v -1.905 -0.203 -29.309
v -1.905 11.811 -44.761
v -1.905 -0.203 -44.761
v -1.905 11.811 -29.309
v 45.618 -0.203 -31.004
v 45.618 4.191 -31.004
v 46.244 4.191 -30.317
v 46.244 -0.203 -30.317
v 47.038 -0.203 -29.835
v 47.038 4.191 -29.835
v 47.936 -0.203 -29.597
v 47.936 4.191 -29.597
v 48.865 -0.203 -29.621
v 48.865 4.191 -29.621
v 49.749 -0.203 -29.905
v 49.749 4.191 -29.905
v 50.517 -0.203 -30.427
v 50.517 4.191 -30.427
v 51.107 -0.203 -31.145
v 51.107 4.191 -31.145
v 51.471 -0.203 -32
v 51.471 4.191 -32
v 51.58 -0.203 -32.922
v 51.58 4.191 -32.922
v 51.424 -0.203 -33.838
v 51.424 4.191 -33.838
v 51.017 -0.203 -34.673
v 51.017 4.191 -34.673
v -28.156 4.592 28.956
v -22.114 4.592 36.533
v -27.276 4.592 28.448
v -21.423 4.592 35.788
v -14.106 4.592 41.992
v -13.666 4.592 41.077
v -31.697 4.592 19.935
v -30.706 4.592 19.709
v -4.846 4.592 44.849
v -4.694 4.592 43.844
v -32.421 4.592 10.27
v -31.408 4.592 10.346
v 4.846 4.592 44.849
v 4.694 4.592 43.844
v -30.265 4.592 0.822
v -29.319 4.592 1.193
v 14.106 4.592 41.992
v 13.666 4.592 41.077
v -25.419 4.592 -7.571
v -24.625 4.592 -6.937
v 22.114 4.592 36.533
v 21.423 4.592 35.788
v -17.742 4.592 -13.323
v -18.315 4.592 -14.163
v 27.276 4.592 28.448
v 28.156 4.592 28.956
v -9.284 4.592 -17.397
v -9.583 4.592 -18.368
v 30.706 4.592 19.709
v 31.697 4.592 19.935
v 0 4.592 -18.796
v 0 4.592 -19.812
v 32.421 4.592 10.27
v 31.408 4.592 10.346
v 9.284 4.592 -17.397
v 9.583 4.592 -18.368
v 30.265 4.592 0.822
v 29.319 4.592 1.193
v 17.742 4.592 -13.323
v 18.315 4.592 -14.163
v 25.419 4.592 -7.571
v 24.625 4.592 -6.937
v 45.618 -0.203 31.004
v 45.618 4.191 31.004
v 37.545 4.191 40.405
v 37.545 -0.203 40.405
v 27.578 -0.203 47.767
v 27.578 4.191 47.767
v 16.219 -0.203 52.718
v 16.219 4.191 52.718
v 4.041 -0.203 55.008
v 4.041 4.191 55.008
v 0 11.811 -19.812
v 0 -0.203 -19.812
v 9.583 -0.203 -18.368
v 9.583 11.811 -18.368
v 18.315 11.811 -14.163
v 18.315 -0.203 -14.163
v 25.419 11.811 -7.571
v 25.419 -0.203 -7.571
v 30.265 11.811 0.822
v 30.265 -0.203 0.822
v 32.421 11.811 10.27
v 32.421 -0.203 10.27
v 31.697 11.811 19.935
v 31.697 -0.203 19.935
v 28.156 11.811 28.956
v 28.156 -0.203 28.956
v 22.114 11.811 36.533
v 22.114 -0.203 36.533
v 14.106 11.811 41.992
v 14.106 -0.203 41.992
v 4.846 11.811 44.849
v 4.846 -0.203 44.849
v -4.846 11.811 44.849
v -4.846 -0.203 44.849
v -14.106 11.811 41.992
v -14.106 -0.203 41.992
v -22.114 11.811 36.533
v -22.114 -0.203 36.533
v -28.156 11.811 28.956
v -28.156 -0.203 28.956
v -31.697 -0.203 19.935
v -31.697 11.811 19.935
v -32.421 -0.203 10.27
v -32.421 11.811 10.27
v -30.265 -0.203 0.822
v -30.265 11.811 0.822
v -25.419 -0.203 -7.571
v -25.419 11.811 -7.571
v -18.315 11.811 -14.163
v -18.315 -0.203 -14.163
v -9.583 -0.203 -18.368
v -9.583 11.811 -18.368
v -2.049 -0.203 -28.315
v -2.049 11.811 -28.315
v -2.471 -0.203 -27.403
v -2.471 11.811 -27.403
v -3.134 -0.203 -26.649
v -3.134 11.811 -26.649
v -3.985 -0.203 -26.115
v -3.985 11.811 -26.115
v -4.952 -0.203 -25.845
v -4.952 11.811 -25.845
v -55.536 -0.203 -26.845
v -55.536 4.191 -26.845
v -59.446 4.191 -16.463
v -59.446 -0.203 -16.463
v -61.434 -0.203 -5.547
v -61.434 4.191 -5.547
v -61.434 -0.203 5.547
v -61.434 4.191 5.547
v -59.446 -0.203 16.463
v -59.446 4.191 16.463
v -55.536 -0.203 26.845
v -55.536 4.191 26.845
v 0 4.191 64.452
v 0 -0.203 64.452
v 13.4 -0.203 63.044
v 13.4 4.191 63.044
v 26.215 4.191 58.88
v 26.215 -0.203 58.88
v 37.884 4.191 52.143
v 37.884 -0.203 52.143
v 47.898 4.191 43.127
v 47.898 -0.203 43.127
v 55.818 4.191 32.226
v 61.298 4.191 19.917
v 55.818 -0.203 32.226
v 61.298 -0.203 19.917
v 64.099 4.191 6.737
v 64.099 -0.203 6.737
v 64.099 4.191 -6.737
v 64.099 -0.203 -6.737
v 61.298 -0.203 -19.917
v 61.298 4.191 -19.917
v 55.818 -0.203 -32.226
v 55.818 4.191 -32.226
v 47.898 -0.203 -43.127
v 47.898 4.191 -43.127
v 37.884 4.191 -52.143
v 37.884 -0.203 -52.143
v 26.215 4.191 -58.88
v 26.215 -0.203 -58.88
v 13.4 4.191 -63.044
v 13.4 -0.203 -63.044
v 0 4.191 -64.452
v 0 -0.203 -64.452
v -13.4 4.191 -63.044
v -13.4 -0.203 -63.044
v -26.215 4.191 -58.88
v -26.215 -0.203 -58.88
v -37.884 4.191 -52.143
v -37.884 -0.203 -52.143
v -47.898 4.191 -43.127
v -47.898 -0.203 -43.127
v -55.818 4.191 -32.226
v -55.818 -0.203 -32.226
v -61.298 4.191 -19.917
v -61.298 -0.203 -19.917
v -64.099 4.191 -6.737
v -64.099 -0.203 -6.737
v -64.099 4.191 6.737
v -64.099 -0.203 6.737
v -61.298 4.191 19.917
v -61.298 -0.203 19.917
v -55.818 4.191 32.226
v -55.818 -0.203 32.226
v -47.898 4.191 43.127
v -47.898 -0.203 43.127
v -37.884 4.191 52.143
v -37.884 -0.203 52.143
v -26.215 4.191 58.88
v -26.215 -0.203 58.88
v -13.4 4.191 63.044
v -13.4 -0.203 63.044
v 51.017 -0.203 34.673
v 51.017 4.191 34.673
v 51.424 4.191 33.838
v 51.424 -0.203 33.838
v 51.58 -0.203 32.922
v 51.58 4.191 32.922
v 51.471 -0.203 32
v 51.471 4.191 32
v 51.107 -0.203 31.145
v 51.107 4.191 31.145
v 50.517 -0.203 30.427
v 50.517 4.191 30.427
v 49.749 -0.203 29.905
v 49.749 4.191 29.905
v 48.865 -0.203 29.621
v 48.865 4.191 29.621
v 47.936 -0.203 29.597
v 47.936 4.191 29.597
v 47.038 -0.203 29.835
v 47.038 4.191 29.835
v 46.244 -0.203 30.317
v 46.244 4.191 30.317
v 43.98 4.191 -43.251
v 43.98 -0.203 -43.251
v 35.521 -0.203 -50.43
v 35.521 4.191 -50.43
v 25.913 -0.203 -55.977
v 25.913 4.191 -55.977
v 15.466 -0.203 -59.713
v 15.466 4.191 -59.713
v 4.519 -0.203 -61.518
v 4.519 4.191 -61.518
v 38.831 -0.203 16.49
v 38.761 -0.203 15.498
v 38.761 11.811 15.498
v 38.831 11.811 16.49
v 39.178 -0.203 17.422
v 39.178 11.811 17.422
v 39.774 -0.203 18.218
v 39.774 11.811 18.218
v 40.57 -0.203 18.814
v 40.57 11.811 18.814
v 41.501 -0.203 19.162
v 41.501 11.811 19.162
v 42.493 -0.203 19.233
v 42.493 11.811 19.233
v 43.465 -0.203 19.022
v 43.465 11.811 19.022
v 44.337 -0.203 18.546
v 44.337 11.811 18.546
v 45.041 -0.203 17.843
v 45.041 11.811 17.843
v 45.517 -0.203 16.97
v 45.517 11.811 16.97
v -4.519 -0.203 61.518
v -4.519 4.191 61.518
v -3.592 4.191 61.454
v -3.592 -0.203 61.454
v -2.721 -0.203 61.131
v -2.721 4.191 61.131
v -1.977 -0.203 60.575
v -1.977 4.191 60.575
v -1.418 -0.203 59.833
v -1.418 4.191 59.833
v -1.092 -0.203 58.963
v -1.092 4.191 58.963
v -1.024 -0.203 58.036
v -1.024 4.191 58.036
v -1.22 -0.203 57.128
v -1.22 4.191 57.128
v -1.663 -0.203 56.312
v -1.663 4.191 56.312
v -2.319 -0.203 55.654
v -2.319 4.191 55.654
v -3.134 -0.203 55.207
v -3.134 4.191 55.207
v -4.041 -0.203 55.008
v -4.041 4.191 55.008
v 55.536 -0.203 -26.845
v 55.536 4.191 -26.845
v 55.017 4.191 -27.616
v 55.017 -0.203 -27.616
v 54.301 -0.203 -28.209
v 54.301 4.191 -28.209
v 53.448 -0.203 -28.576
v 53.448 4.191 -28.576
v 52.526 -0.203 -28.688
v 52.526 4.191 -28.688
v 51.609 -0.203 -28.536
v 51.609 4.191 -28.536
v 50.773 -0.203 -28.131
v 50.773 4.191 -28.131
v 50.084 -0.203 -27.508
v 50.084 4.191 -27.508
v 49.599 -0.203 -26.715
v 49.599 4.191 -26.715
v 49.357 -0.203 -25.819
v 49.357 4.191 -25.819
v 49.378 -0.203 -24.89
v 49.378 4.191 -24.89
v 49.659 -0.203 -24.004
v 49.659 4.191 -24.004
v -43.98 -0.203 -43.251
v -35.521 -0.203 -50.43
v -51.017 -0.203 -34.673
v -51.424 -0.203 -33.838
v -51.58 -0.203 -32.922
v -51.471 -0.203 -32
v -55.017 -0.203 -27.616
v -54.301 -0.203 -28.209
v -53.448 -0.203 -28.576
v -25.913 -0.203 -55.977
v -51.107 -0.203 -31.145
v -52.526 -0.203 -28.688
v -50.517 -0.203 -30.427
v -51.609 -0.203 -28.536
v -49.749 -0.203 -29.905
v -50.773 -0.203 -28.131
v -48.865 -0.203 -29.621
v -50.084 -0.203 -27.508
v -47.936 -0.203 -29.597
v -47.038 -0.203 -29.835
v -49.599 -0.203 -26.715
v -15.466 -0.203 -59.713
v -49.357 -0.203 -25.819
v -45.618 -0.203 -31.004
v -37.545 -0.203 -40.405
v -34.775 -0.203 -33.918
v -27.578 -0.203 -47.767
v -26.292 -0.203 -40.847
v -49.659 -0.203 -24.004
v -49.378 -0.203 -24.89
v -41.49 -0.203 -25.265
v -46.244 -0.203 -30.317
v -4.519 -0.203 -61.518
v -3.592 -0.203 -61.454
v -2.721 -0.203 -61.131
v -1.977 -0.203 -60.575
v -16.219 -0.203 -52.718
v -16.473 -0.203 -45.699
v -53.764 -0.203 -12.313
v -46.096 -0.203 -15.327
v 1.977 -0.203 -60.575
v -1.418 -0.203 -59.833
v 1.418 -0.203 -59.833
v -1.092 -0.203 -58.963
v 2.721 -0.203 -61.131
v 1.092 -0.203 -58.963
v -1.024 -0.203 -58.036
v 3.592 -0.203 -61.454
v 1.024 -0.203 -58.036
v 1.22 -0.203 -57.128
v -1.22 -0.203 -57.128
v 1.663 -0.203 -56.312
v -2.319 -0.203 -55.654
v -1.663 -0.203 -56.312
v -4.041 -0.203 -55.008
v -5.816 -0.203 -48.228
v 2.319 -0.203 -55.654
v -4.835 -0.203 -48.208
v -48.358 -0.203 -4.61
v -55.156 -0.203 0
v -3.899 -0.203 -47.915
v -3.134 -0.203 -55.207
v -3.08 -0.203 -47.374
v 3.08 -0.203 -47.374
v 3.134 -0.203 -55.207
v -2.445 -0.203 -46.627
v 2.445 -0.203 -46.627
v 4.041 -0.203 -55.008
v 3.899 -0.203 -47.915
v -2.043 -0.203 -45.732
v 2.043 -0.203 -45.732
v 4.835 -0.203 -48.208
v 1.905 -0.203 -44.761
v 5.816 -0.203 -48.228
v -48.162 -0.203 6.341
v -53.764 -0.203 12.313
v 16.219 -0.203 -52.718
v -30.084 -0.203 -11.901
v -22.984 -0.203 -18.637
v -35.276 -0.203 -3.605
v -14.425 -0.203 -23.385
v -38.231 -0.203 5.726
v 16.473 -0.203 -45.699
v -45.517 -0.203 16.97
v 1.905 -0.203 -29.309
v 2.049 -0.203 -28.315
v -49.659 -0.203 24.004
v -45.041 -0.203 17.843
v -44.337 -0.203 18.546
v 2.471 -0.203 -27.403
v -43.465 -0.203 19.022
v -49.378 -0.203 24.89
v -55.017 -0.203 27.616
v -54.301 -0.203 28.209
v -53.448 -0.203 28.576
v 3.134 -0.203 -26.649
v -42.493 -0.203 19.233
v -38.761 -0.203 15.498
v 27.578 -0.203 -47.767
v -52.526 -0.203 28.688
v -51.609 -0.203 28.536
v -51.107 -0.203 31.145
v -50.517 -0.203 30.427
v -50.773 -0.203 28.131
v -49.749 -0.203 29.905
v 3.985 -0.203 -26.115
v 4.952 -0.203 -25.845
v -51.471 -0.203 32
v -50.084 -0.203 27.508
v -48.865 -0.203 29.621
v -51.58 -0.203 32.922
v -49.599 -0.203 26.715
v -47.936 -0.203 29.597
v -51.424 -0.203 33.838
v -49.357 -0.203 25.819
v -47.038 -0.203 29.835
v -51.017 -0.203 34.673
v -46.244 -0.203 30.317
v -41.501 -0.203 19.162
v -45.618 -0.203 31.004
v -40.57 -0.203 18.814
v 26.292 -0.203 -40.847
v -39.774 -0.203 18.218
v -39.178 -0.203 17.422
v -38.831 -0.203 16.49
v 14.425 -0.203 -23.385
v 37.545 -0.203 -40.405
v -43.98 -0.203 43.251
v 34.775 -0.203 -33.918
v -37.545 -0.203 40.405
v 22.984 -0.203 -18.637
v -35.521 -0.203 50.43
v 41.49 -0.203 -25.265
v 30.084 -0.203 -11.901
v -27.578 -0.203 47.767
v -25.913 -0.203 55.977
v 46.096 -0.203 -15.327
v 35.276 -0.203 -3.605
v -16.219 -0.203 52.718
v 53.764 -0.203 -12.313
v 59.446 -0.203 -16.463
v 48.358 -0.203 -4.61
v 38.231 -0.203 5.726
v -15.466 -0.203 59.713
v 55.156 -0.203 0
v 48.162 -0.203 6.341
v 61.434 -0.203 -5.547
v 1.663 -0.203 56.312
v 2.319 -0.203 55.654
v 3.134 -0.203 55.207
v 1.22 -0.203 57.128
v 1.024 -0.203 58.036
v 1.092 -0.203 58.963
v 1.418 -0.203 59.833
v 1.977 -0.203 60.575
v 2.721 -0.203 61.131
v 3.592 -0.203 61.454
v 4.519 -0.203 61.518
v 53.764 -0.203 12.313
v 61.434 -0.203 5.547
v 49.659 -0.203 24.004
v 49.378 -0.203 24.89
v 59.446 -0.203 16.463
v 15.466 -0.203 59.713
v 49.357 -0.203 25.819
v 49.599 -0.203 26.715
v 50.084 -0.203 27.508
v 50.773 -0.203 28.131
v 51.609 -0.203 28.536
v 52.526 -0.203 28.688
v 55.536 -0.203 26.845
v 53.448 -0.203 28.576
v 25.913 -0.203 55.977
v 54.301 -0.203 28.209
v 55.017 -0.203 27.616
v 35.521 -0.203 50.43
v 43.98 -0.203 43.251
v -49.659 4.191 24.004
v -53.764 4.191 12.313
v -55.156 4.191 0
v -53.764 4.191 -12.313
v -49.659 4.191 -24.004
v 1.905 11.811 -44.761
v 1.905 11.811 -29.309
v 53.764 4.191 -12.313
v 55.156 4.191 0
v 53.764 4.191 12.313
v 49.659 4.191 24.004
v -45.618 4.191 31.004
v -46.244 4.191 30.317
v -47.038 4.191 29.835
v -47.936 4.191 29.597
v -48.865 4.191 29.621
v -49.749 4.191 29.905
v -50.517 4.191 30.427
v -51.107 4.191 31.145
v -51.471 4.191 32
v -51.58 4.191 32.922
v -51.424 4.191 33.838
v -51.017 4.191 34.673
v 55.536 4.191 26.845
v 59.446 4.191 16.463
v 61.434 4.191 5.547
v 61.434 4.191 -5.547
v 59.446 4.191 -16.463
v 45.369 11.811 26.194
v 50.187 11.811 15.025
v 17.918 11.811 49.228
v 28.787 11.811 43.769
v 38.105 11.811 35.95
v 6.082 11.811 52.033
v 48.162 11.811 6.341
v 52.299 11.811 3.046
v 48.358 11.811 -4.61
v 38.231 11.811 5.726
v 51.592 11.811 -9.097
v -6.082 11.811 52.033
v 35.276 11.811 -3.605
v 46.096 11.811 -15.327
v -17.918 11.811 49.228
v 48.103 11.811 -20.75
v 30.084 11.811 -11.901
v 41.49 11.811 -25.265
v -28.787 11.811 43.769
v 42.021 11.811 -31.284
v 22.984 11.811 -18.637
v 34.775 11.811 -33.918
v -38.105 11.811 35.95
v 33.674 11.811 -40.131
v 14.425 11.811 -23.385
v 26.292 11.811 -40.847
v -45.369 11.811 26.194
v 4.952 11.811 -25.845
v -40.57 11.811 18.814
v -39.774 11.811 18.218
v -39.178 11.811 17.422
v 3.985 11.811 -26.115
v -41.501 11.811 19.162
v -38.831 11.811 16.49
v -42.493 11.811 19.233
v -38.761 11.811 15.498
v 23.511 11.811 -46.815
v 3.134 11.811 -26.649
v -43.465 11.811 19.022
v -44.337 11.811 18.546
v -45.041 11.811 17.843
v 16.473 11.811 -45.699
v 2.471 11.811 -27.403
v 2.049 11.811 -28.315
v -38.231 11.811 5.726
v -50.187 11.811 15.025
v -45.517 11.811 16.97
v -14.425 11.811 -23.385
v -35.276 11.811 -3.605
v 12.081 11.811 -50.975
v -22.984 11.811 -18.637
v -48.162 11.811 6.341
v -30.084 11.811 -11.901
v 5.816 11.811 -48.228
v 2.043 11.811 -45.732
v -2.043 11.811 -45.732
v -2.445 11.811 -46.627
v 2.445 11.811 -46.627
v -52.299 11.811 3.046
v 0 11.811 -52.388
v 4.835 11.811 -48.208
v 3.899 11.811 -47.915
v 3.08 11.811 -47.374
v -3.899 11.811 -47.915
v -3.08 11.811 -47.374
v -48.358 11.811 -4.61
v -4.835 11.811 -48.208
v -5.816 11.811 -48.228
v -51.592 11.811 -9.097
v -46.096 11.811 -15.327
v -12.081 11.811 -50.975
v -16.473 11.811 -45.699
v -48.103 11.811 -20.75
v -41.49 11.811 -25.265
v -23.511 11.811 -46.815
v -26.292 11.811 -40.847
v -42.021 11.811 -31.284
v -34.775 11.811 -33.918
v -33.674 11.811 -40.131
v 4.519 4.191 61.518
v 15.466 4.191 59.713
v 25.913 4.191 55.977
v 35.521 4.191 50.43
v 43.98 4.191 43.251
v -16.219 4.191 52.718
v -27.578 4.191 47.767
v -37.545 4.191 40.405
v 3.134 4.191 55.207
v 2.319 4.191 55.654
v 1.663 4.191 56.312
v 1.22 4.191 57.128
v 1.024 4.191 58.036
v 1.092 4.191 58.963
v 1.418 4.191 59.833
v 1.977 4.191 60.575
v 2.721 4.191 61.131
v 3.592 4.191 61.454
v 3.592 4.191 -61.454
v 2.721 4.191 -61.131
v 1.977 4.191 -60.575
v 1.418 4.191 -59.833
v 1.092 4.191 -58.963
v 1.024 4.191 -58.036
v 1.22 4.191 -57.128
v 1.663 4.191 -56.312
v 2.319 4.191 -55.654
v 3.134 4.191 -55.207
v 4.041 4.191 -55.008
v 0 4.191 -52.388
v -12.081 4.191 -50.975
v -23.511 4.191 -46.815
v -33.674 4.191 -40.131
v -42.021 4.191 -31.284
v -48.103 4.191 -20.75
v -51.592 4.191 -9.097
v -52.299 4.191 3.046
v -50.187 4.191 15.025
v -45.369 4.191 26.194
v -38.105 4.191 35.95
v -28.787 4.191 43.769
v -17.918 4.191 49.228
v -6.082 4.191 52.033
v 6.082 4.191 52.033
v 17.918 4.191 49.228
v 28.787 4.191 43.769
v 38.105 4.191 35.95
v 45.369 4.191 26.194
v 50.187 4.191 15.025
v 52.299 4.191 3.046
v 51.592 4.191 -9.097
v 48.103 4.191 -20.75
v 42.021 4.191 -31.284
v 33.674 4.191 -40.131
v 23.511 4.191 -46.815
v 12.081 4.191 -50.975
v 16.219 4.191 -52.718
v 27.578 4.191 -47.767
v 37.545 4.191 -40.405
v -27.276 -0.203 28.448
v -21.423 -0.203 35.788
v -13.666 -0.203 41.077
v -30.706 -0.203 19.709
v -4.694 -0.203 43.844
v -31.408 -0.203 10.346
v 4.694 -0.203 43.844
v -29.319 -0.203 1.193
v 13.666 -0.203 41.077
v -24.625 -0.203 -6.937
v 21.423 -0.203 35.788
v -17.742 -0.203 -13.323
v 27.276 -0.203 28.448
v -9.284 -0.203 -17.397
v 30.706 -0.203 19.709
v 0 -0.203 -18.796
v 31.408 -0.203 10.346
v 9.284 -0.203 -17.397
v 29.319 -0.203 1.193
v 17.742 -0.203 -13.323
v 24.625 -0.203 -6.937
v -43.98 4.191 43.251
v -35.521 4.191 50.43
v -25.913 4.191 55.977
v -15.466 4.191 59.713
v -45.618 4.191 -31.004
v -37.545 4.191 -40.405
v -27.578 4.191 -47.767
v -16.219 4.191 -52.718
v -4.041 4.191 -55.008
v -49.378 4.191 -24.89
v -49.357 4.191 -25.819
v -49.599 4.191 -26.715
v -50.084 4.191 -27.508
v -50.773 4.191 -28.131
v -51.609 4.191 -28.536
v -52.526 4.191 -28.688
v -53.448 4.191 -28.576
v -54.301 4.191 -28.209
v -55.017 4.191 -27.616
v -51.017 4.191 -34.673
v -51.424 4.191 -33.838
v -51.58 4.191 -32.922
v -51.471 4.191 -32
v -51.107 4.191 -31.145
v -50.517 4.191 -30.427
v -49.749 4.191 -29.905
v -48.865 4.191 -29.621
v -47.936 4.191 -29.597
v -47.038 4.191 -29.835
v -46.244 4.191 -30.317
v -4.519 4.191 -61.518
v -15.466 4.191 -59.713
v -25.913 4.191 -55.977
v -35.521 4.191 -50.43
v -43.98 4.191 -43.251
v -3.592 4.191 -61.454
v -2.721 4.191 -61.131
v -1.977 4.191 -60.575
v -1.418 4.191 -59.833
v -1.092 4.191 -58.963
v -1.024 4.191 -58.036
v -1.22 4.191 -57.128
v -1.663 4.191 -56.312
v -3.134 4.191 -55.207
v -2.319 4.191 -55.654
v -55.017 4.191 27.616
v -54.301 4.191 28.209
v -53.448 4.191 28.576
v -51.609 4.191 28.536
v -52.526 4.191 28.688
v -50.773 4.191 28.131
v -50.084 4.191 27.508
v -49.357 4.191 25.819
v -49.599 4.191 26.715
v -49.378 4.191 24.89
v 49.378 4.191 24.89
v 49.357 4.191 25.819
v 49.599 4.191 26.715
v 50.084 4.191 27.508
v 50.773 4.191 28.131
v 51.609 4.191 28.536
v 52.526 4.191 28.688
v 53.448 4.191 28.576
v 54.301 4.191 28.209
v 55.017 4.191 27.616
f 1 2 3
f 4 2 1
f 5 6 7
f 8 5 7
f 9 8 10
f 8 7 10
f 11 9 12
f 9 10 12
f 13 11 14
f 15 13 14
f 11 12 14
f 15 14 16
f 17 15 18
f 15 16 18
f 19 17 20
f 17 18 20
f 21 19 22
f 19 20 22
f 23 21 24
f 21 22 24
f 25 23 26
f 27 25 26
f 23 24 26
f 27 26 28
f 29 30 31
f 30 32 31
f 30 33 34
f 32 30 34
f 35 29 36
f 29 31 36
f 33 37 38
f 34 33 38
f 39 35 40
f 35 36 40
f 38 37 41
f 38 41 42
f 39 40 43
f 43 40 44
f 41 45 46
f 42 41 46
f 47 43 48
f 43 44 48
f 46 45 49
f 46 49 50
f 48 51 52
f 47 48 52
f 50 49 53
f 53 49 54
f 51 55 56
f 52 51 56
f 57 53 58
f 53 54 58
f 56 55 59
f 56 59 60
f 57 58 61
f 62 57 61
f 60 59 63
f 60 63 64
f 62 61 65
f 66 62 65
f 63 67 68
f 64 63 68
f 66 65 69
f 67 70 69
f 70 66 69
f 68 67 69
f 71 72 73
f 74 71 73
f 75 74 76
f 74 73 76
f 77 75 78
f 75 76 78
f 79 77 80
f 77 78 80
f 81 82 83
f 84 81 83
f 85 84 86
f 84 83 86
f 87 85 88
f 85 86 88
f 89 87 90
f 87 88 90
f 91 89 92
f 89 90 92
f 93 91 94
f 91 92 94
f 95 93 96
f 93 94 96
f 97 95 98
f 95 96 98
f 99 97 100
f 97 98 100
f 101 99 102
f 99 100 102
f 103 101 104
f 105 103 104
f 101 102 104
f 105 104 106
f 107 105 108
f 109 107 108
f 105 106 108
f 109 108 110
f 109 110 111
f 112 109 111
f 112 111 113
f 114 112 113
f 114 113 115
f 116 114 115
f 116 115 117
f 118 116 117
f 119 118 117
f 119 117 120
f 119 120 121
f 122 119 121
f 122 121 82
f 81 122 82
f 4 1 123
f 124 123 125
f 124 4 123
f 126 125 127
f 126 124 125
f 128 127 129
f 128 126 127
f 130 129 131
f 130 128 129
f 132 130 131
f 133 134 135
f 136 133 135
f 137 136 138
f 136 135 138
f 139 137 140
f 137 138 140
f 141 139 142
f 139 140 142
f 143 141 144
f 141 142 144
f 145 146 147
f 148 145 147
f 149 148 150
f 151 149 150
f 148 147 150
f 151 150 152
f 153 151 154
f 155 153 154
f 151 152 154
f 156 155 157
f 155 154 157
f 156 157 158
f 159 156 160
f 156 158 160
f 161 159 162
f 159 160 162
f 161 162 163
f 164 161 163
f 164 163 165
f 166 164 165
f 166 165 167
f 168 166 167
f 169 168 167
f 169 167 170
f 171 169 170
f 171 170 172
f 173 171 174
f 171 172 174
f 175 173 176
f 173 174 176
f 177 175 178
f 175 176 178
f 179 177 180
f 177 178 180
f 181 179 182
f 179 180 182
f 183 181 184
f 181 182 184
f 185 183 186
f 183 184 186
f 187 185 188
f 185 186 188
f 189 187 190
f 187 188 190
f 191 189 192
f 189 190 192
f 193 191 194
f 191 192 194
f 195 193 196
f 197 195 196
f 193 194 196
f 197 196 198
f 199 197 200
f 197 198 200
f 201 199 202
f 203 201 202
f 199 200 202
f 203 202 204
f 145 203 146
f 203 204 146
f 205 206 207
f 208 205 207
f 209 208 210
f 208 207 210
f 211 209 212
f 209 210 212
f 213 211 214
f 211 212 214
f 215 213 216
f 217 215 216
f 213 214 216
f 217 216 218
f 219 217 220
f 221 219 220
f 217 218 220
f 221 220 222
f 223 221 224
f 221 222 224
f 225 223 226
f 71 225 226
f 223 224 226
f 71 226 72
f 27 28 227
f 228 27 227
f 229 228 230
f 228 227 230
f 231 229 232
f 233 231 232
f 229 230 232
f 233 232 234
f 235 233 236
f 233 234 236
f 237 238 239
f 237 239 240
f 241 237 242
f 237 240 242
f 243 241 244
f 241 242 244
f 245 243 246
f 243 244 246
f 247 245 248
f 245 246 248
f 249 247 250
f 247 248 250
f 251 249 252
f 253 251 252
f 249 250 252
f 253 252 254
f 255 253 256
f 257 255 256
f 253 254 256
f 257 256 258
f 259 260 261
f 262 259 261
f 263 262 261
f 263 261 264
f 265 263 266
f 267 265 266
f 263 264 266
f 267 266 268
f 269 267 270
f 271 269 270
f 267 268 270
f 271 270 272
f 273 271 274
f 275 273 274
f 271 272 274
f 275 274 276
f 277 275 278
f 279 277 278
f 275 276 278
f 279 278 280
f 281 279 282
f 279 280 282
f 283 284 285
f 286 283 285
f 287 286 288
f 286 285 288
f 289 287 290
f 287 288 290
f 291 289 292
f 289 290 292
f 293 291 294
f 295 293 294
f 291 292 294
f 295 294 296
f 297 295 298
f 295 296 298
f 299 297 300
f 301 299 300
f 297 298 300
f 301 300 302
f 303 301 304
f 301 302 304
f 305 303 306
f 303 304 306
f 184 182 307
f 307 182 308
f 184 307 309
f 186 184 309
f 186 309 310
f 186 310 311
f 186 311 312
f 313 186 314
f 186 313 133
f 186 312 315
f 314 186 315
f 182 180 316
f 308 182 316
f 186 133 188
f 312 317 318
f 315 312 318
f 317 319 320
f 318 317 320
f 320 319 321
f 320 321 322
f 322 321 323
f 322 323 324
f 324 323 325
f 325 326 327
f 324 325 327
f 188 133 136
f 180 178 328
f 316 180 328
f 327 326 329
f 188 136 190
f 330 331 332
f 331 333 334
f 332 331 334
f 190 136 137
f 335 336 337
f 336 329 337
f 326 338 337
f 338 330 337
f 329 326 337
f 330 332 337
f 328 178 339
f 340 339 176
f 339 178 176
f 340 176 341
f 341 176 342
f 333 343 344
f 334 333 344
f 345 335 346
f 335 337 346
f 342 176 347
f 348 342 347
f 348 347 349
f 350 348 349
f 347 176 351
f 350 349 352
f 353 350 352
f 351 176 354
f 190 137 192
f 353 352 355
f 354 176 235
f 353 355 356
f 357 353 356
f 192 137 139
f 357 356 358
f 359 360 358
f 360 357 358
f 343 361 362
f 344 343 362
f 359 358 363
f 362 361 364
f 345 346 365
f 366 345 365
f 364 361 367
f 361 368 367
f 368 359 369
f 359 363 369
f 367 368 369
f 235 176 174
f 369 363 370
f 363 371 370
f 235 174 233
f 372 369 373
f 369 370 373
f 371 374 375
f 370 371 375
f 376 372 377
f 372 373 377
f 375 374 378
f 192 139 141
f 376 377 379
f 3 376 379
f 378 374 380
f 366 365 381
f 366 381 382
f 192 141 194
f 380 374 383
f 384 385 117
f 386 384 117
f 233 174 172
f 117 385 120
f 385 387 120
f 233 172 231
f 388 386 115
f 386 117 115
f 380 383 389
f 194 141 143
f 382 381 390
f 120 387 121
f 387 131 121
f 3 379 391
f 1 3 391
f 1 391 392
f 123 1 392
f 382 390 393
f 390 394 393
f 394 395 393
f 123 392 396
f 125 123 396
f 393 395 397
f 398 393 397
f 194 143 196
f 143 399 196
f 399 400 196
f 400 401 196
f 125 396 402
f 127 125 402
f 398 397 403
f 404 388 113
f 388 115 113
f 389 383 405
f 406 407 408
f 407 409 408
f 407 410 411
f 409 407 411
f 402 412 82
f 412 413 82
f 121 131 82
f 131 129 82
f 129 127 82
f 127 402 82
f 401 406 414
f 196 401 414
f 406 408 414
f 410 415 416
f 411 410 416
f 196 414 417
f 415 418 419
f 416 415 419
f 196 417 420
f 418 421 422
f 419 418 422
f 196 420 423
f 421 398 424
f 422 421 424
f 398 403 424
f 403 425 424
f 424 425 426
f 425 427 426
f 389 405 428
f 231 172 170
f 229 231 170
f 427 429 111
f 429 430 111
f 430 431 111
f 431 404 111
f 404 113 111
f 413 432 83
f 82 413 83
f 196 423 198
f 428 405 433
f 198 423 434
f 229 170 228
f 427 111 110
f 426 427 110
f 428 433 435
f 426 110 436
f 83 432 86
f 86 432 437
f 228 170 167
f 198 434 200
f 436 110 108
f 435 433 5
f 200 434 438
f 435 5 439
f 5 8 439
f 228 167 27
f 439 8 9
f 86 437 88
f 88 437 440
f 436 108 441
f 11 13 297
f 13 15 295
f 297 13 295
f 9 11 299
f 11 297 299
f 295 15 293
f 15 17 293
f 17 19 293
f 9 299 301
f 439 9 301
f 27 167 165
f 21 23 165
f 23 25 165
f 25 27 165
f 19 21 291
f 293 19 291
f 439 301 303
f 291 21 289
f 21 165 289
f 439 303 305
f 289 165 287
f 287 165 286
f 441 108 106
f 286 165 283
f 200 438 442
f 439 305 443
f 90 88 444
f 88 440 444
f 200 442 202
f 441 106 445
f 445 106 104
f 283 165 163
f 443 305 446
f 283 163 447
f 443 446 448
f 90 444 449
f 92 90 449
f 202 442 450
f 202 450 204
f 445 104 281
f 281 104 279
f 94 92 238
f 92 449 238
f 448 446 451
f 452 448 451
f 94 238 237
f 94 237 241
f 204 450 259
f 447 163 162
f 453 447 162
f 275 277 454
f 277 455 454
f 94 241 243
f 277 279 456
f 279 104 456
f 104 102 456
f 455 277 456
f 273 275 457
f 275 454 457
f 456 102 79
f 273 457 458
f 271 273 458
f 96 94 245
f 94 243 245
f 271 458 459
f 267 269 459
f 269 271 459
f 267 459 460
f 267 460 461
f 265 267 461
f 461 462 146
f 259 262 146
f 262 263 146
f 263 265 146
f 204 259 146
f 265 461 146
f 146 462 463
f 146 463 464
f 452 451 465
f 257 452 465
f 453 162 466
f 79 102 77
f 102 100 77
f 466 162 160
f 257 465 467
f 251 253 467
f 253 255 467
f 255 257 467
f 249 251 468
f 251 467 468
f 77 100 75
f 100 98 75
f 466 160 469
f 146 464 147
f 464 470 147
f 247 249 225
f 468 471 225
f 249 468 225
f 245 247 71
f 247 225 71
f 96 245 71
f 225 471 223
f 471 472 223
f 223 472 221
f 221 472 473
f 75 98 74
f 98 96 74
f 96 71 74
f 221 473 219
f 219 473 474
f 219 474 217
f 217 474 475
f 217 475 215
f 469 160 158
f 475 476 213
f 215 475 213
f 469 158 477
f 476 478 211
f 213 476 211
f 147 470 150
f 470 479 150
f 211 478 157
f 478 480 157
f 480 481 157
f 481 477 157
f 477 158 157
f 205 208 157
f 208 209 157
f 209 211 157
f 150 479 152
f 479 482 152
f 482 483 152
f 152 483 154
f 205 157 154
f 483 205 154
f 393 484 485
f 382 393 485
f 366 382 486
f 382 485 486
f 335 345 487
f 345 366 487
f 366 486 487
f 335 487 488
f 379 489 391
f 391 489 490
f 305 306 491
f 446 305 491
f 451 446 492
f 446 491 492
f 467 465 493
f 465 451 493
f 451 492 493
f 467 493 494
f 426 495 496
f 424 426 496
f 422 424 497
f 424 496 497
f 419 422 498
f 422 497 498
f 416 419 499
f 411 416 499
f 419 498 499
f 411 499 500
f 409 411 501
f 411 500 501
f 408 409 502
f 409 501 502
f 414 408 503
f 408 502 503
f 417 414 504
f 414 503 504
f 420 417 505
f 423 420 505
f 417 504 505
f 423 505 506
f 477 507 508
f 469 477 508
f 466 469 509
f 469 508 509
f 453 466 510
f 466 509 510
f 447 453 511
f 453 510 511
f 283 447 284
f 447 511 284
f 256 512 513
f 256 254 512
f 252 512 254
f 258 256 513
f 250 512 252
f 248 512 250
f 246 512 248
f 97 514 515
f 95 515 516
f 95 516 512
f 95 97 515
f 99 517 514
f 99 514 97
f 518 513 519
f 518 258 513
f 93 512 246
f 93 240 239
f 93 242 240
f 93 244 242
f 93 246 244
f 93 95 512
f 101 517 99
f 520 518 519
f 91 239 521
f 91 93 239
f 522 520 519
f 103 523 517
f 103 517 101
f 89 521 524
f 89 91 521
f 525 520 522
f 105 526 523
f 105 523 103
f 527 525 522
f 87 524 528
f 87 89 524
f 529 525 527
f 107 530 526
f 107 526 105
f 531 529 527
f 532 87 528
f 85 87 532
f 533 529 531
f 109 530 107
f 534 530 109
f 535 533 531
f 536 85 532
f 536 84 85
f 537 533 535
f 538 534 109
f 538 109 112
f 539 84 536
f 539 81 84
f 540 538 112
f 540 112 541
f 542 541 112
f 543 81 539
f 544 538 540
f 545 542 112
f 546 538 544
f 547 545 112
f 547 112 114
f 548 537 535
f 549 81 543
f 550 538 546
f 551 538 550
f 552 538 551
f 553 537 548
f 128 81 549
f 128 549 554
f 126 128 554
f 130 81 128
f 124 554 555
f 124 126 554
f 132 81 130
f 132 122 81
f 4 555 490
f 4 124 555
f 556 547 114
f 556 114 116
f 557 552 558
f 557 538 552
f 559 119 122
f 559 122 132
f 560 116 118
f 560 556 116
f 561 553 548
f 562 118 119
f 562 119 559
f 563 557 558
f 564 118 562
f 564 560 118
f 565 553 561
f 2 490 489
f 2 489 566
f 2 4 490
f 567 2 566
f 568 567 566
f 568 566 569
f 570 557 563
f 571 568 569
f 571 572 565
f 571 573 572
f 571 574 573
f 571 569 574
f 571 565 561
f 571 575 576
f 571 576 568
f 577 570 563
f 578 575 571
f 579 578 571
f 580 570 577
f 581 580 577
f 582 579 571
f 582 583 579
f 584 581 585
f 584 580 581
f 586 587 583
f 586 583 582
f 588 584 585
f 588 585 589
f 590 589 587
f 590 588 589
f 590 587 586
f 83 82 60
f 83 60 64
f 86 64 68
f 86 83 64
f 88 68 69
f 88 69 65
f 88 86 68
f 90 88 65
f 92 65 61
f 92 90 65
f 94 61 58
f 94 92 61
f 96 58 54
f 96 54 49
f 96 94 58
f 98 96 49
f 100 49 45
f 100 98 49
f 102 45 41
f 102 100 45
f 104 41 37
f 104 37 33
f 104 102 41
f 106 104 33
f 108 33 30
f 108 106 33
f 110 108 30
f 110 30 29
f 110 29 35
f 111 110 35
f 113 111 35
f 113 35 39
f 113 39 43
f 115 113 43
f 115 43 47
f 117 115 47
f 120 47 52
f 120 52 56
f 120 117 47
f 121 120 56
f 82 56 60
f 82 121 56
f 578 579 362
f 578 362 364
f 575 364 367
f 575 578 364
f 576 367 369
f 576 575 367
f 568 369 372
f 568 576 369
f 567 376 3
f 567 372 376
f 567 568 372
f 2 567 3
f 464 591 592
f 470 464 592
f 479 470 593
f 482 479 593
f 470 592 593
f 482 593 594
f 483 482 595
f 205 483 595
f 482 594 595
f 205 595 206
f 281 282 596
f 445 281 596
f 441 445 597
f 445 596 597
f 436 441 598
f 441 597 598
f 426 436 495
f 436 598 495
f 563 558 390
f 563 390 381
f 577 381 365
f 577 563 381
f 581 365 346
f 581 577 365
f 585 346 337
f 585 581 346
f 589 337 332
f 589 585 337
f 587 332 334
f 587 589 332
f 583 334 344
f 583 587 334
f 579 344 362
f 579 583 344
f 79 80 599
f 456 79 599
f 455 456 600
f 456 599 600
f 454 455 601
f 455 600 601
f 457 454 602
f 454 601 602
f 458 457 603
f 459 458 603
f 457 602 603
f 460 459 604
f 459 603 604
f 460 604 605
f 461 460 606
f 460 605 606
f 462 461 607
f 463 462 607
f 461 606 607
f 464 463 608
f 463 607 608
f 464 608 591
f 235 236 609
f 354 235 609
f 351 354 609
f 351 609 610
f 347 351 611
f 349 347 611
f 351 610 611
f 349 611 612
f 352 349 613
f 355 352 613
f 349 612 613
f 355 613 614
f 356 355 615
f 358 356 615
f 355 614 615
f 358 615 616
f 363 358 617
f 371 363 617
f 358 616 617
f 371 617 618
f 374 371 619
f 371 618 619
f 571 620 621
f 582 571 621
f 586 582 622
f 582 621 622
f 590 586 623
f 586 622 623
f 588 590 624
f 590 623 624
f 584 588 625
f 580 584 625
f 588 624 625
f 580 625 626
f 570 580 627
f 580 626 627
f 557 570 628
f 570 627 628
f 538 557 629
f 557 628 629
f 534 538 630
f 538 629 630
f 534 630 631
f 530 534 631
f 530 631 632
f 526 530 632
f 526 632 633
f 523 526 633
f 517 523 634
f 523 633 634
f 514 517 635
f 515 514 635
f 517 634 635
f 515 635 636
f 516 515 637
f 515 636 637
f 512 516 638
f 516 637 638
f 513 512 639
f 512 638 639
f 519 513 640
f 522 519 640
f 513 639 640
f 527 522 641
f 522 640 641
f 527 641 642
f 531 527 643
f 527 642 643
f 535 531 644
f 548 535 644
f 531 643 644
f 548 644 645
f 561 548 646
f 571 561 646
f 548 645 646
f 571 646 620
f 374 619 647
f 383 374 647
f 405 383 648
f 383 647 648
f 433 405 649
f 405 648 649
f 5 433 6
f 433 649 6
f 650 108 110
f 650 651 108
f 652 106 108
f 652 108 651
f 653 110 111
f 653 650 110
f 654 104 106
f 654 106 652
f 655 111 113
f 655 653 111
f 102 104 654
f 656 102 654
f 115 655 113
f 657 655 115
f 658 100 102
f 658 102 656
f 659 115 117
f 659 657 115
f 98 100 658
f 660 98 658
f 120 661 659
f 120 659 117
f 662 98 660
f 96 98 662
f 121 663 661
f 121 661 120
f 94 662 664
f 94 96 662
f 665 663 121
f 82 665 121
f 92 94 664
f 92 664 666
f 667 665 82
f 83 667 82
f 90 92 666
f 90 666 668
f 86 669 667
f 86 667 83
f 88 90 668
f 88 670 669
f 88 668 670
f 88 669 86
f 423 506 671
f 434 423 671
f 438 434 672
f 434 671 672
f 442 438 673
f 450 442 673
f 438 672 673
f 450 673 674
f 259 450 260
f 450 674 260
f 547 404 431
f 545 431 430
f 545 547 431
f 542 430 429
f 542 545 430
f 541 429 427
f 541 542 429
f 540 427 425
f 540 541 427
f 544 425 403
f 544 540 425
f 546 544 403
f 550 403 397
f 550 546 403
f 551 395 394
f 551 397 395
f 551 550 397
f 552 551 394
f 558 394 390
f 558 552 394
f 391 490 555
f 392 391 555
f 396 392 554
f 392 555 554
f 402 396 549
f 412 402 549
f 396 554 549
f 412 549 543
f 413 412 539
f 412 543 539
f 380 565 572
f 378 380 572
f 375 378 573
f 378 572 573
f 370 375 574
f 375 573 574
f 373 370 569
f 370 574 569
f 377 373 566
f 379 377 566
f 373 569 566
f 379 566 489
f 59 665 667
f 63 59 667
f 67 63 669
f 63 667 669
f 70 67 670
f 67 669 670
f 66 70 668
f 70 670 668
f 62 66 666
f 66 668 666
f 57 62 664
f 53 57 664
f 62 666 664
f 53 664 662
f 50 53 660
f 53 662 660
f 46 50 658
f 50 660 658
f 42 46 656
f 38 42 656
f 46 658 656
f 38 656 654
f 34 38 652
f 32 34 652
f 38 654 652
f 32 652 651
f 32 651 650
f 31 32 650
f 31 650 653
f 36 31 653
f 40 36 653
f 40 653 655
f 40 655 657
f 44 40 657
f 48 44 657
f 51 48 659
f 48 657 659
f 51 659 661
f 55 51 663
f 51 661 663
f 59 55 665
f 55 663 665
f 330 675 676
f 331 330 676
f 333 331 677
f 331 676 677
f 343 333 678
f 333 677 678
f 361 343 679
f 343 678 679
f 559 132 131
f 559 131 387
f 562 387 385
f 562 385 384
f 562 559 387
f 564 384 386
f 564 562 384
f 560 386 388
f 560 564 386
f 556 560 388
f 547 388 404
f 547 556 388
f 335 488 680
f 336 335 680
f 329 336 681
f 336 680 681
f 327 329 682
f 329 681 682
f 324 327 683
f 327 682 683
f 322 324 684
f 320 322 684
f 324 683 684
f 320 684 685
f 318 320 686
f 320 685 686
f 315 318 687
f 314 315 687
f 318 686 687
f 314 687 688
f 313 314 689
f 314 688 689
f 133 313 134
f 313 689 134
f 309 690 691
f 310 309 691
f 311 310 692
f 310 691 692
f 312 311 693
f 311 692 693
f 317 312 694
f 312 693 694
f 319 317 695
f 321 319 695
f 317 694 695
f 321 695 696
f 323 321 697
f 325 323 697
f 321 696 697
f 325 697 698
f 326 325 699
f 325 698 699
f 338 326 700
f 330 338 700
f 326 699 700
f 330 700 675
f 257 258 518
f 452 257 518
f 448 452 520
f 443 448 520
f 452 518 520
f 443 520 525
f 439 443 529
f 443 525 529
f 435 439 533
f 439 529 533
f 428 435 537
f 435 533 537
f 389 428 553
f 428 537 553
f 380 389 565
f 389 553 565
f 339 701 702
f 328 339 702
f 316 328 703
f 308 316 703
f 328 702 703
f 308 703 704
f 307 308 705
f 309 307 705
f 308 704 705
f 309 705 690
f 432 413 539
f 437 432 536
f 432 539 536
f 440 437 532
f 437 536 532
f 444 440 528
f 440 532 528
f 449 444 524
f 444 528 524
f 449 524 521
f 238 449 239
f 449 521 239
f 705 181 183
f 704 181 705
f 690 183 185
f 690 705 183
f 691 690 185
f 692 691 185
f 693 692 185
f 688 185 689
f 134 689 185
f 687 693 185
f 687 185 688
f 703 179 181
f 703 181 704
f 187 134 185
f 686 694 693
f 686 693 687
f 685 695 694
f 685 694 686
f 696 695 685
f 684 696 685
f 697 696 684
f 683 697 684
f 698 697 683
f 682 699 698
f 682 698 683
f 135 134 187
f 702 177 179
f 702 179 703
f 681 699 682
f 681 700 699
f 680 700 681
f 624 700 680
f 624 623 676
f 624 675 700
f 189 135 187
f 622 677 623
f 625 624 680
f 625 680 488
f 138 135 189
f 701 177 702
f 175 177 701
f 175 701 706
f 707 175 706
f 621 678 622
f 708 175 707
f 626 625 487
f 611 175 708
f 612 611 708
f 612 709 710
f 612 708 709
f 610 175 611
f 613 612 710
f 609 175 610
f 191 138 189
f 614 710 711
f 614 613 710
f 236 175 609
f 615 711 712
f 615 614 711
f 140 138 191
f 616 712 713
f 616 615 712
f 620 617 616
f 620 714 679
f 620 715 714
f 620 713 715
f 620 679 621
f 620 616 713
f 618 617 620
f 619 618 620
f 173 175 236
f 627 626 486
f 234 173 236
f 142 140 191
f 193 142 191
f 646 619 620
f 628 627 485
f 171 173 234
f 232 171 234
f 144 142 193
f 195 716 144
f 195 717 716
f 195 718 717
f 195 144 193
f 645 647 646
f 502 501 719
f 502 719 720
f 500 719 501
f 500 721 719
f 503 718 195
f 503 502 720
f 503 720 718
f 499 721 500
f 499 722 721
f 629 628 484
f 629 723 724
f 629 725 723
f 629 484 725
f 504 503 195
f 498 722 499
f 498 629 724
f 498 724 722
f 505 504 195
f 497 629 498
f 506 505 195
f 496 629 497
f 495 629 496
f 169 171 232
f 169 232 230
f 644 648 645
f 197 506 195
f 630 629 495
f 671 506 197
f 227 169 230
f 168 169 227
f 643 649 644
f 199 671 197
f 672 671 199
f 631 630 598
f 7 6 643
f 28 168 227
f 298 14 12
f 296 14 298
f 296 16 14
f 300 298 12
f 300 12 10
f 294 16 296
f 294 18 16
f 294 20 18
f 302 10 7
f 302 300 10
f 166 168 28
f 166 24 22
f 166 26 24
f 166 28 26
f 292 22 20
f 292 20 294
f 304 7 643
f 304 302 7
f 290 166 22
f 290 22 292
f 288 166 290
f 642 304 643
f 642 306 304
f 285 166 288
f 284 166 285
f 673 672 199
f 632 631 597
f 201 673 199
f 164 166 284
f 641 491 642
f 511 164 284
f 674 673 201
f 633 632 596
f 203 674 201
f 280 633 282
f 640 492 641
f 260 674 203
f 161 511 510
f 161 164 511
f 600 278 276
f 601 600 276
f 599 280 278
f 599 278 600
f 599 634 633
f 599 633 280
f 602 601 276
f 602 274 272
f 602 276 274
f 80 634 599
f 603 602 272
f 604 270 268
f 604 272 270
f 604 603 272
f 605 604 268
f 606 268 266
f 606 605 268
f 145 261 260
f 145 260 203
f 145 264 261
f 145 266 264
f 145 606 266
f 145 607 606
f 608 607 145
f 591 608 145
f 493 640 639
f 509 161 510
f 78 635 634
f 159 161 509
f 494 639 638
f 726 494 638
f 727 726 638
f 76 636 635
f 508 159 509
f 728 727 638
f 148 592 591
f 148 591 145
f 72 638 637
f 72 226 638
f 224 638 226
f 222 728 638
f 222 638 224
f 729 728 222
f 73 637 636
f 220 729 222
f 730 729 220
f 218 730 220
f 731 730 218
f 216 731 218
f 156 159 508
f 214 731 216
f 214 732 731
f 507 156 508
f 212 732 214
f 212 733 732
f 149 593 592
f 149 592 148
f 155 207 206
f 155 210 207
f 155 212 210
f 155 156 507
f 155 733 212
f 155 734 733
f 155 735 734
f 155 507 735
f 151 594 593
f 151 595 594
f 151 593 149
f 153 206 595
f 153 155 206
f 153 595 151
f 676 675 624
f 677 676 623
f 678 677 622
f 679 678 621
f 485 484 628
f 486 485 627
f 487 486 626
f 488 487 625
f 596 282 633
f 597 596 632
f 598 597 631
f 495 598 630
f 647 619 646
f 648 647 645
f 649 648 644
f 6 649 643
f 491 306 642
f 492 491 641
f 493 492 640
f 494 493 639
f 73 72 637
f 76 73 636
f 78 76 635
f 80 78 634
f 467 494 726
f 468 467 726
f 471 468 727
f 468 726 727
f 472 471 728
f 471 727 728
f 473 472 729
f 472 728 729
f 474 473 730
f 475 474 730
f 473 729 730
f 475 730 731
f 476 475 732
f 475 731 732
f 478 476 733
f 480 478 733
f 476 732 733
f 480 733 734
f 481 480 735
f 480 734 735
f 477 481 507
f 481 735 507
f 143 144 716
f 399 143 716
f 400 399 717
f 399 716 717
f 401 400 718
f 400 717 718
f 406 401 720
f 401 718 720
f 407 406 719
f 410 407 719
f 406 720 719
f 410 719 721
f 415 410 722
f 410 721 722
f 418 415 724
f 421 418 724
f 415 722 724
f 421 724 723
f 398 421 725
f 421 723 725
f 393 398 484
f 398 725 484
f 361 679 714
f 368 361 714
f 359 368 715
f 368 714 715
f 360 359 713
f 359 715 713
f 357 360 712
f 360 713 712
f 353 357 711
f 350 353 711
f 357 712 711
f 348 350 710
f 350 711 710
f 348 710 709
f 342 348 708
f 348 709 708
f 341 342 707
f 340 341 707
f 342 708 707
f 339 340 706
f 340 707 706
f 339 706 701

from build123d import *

# Parameters (mm, degrees)
SLOTTED_BODY_EXTRUDE_DEPTH      = 4.191
SLOTTED_BODY_EXTRUDE_DEPTH_BACK = 0.2032
SKETCH1_R                       = 64.4525
SKETCH1_R_2                     = 30.988
SKETCH5_R                       = 52.3875
BOSS_EXTRUDE3_DEPTH             = 7.62
SKETCH6_R                       = 32.512
CUT_EXTRUDE5_DEPTH              = 92.937971014
SKETCH8_R                       = 32.512
SKETCH8_R_2                     = 31.496
BOSS_EXTRUDE4_DEPTH             = 4.795000062
CUT_EXTRUDE6_DEPTH              = 92.937971014
CUT_EXTRUDE7_DEPTH              = 92.467556612


with BuildPart() as part:
    # Sketch1 → Slotted-Body Extrude (new, two sides: drawn at the far end of the back side and taken through both)
    with BuildSketch(Plane(origin=(0, 0, 0), x_dir=(1, 0, 0), z_dir=(0, 1, 0)).offset(-SLOTTED_BODY_EXTRUDE_DEPTH_BACK)):
        Circle(SKETCH1_R)
        with Locations((0, -12.7)):
            Circle(SKETCH1_R_2, mode=Mode.SUBTRACT)
    extrude(amount=SLOTTED_BODY_EXTRUDE_DEPTH + SLOTTED_BODY_EXTRUDE_DEPTH_BACK)

    # Sketch5 → Boss-Extrude3 (add)
    with BuildSketch(Plane(origin=(0, 4.191, 0), x_dir=(1, 0, 0), z_dir=(0, 1, 0))):
        Circle(SKETCH5_R)
    extrude(amount=BOSS_EXTRUDE3_DEPTH)

    # Sketch6 → Cut-Extrude5 (cut, through all)
    with BuildSketch(Plane.XZ.offset(0.2032)):
        with Locations((0, 12.7)):
            Circle(SKETCH6_R)
    extrude(amount=-CUT_EXTRUDE5_DEPTH, mode=Mode.SUBTRACT)

    # Sketch16 → Cut-Extrude6 (cut, through all)
    with BuildSketch(Plane(origin=(0, 11.811, 0), x_dir=(1, 0, 0), z_dir=(0, 1, 0))):
        with BuildLine():
            ThreePointArc((5.815616197, 48.228125762), (3.080466829, 47.37396317), (1.905, 44.760744171))
            Line((1.905, 44.760744171), (1.905, 29.30917357))
            ThreePointArc((1.905, 29.30917357), (2.775290296, 27.00232019), (4.952428786, 25.845148763))
            ThreePointArc((4.952428786, 25.845148763), (30.083852846, 11.901155297), (38.761124089, -15.498267924))
            ThreePointArc((38.761124089, -15.498267924), (41.501270881, -19.162235056), (45.517024238, -16.969797016))
            ThreePointArc((45.517024238, -16.969797016), (41.490387768, 25.265019871), (5.815616197, 48.228125762))
        make_face()
        with BuildLine():
            Line((-1.905, 29.30917357), (-1.905, 44.760744171))
            ThreePointArc((-1.905, 44.760744171), (-3.080466829, 47.37396317), (-5.815616197, 48.228125762))
            ThreePointArc((-5.815616197, 48.228125762), (-41.490387768, 25.265019871), (-45.517024238, -16.969797016))
            ThreePointArc((-45.517024238, -16.969797016), (-41.501270881, -19.162235056), (-38.761124089, -15.498267924))
            ThreePointArc((-38.761124089, -15.498267924), (-30.083852846, 11.901155297), (-4.952428786, 25.845148763))
            ThreePointArc((-4.952428786, 25.845148763), (-2.775290296, 27.00232019), (-1.905, 29.30917357))
        make_face()
    extrude(amount=-CUT_EXTRUDE6_DEPTH, mode=Mode.SUBTRACT)

    # Sketch12 → Cut-Extrude7 (cut, through all)
    with BuildSketch(Plane(origin=(0, 4.191, 0), x_dir=(1, 0, 0), z_dir=(0, 1, 0))):
        with BuildLine():
            ThreePointArc((-51.016643626, -34.67283652), (-30.84195, -53.419824404), (-4.519235435, -61.518127656))
            ThreePointArc((-4.519235435, -61.518127656), (-1.024979245, -58.502126976), (-4.040979925, -55.007870786))
            ThreePointArc((-4.040979925, -55.007870786), (-27.57805, -47.766583774), (-45.617723547, -31.003526664))
            ThreePointArc((-45.617723547, -31.003526664), (-50.151838514, -30.138721553), (-51.016643626, -34.67283652))
        make_face()
        with BuildLine():
            ThreePointArc((-55.535879061, -26.845291136), (-51.176817759, -28.363405424), (-49.658703471, -24.004344122))
            ThreePointArc((-49.658703471, -24.004344122), (-55.1561, 0), (-49.658703471, 24.004344122))
            ThreePointArc((-49.658703471, 24.004344122), (-51.176817759, 28.363405424), (-55.535879061, 26.845291136))
            ThreePointArc((-55.535879061, 26.845291136), (-61.6839, 0), (-55.535879061, -26.845291136))
        make_face()
        with BuildLine():
            ThreePointArc((-51.016643626, 34.67283652), (-50.151838514, 30.138721553), (-45.617723547, 31.003526664))
            ThreePointArc((-45.617723547, 31.003526664), (-27.57805, 47.766583774), (-4.040979925, 55.007870786))
            ThreePointArc((-4.040979925, 55.007870786), (-1.024979245, 58.502126976), (-4.519235435, 61.518127656))
            ThreePointArc((-4.519235435, 61.518127656), (-30.84195, 53.419824404), (-51.016643626, 34.67283652))
        make_face()
        with BuildLine():
            ThreePointArc((4.519235435, 61.518127656), (1.024979245, 58.502126976), (4.040979925, 55.007870786))
            ThreePointArc((4.040979925, 55.007870786), (27.57805, 47.766583774), (45.617723547, 31.003526664))
            ThreePointArc((45.617723547, 31.003526664), (50.151838514, 30.138721553), (51.016643626, 34.67283652))
            ThreePointArc((51.016643626, 34.67283652), (30.84195, 53.419824404), (4.519235435, 61.518127656))
        make_face()
        with BuildLine():
            ThreePointArc((55.535879061, 26.845291136), (51.176817759, 28.363405424), (49.658703471, 24.004344122))
            ThreePointArc((49.658703471, 24.004344122), (55.1561, 0), (49.658703471, -24.004344122))
            ThreePointArc((49.658703471, -24.004344122), (51.176817759, -28.363405424), (55.535879061, -26.845291136))
            ThreePointArc((55.535879061, -26.845291136), (61.6839, 0), (55.535879061, 26.845291136))
        make_face()
        with BuildLine():
            ThreePointArc((51.016643626, -34.67283652), (50.151838514, -30.138721553), (45.617723547, -31.003526664))
            ThreePointArc((45.617723547, -31.003526664), (27.57805, -47.766583774), (4.040979925, -55.007870786))
            ThreePointArc((4.040979925, -55.007870786), (1.024979245, -58.502126976), (4.519235435, -61.518127656))
            ThreePointArc((4.519235435, -61.518127656), (30.84195, -53.419824404), (51.016643626, -34.67283652))
        make_face()
    extrude(amount=-CUT_EXTRUDE7_DEPTH, mode=Mode.SUBTRACT)


with BuildPart() as body_2:
    # Sketch8 → Boss-Extrude4 (new body)
    with BuildSketch(Plane.XZ.offset(0.2032)):
        with Locations((0, 12.7)):
            Circle(SKETCH8_R)
        with Locations((0, 12.7)):
            Circle(SKETCH8_R_2, mode=Mode.SUBTRACT)
    extrude(amount=-BOSS_EXTRUDE4_DEPTH)


solid = Compound([part.part, body_2.part])
